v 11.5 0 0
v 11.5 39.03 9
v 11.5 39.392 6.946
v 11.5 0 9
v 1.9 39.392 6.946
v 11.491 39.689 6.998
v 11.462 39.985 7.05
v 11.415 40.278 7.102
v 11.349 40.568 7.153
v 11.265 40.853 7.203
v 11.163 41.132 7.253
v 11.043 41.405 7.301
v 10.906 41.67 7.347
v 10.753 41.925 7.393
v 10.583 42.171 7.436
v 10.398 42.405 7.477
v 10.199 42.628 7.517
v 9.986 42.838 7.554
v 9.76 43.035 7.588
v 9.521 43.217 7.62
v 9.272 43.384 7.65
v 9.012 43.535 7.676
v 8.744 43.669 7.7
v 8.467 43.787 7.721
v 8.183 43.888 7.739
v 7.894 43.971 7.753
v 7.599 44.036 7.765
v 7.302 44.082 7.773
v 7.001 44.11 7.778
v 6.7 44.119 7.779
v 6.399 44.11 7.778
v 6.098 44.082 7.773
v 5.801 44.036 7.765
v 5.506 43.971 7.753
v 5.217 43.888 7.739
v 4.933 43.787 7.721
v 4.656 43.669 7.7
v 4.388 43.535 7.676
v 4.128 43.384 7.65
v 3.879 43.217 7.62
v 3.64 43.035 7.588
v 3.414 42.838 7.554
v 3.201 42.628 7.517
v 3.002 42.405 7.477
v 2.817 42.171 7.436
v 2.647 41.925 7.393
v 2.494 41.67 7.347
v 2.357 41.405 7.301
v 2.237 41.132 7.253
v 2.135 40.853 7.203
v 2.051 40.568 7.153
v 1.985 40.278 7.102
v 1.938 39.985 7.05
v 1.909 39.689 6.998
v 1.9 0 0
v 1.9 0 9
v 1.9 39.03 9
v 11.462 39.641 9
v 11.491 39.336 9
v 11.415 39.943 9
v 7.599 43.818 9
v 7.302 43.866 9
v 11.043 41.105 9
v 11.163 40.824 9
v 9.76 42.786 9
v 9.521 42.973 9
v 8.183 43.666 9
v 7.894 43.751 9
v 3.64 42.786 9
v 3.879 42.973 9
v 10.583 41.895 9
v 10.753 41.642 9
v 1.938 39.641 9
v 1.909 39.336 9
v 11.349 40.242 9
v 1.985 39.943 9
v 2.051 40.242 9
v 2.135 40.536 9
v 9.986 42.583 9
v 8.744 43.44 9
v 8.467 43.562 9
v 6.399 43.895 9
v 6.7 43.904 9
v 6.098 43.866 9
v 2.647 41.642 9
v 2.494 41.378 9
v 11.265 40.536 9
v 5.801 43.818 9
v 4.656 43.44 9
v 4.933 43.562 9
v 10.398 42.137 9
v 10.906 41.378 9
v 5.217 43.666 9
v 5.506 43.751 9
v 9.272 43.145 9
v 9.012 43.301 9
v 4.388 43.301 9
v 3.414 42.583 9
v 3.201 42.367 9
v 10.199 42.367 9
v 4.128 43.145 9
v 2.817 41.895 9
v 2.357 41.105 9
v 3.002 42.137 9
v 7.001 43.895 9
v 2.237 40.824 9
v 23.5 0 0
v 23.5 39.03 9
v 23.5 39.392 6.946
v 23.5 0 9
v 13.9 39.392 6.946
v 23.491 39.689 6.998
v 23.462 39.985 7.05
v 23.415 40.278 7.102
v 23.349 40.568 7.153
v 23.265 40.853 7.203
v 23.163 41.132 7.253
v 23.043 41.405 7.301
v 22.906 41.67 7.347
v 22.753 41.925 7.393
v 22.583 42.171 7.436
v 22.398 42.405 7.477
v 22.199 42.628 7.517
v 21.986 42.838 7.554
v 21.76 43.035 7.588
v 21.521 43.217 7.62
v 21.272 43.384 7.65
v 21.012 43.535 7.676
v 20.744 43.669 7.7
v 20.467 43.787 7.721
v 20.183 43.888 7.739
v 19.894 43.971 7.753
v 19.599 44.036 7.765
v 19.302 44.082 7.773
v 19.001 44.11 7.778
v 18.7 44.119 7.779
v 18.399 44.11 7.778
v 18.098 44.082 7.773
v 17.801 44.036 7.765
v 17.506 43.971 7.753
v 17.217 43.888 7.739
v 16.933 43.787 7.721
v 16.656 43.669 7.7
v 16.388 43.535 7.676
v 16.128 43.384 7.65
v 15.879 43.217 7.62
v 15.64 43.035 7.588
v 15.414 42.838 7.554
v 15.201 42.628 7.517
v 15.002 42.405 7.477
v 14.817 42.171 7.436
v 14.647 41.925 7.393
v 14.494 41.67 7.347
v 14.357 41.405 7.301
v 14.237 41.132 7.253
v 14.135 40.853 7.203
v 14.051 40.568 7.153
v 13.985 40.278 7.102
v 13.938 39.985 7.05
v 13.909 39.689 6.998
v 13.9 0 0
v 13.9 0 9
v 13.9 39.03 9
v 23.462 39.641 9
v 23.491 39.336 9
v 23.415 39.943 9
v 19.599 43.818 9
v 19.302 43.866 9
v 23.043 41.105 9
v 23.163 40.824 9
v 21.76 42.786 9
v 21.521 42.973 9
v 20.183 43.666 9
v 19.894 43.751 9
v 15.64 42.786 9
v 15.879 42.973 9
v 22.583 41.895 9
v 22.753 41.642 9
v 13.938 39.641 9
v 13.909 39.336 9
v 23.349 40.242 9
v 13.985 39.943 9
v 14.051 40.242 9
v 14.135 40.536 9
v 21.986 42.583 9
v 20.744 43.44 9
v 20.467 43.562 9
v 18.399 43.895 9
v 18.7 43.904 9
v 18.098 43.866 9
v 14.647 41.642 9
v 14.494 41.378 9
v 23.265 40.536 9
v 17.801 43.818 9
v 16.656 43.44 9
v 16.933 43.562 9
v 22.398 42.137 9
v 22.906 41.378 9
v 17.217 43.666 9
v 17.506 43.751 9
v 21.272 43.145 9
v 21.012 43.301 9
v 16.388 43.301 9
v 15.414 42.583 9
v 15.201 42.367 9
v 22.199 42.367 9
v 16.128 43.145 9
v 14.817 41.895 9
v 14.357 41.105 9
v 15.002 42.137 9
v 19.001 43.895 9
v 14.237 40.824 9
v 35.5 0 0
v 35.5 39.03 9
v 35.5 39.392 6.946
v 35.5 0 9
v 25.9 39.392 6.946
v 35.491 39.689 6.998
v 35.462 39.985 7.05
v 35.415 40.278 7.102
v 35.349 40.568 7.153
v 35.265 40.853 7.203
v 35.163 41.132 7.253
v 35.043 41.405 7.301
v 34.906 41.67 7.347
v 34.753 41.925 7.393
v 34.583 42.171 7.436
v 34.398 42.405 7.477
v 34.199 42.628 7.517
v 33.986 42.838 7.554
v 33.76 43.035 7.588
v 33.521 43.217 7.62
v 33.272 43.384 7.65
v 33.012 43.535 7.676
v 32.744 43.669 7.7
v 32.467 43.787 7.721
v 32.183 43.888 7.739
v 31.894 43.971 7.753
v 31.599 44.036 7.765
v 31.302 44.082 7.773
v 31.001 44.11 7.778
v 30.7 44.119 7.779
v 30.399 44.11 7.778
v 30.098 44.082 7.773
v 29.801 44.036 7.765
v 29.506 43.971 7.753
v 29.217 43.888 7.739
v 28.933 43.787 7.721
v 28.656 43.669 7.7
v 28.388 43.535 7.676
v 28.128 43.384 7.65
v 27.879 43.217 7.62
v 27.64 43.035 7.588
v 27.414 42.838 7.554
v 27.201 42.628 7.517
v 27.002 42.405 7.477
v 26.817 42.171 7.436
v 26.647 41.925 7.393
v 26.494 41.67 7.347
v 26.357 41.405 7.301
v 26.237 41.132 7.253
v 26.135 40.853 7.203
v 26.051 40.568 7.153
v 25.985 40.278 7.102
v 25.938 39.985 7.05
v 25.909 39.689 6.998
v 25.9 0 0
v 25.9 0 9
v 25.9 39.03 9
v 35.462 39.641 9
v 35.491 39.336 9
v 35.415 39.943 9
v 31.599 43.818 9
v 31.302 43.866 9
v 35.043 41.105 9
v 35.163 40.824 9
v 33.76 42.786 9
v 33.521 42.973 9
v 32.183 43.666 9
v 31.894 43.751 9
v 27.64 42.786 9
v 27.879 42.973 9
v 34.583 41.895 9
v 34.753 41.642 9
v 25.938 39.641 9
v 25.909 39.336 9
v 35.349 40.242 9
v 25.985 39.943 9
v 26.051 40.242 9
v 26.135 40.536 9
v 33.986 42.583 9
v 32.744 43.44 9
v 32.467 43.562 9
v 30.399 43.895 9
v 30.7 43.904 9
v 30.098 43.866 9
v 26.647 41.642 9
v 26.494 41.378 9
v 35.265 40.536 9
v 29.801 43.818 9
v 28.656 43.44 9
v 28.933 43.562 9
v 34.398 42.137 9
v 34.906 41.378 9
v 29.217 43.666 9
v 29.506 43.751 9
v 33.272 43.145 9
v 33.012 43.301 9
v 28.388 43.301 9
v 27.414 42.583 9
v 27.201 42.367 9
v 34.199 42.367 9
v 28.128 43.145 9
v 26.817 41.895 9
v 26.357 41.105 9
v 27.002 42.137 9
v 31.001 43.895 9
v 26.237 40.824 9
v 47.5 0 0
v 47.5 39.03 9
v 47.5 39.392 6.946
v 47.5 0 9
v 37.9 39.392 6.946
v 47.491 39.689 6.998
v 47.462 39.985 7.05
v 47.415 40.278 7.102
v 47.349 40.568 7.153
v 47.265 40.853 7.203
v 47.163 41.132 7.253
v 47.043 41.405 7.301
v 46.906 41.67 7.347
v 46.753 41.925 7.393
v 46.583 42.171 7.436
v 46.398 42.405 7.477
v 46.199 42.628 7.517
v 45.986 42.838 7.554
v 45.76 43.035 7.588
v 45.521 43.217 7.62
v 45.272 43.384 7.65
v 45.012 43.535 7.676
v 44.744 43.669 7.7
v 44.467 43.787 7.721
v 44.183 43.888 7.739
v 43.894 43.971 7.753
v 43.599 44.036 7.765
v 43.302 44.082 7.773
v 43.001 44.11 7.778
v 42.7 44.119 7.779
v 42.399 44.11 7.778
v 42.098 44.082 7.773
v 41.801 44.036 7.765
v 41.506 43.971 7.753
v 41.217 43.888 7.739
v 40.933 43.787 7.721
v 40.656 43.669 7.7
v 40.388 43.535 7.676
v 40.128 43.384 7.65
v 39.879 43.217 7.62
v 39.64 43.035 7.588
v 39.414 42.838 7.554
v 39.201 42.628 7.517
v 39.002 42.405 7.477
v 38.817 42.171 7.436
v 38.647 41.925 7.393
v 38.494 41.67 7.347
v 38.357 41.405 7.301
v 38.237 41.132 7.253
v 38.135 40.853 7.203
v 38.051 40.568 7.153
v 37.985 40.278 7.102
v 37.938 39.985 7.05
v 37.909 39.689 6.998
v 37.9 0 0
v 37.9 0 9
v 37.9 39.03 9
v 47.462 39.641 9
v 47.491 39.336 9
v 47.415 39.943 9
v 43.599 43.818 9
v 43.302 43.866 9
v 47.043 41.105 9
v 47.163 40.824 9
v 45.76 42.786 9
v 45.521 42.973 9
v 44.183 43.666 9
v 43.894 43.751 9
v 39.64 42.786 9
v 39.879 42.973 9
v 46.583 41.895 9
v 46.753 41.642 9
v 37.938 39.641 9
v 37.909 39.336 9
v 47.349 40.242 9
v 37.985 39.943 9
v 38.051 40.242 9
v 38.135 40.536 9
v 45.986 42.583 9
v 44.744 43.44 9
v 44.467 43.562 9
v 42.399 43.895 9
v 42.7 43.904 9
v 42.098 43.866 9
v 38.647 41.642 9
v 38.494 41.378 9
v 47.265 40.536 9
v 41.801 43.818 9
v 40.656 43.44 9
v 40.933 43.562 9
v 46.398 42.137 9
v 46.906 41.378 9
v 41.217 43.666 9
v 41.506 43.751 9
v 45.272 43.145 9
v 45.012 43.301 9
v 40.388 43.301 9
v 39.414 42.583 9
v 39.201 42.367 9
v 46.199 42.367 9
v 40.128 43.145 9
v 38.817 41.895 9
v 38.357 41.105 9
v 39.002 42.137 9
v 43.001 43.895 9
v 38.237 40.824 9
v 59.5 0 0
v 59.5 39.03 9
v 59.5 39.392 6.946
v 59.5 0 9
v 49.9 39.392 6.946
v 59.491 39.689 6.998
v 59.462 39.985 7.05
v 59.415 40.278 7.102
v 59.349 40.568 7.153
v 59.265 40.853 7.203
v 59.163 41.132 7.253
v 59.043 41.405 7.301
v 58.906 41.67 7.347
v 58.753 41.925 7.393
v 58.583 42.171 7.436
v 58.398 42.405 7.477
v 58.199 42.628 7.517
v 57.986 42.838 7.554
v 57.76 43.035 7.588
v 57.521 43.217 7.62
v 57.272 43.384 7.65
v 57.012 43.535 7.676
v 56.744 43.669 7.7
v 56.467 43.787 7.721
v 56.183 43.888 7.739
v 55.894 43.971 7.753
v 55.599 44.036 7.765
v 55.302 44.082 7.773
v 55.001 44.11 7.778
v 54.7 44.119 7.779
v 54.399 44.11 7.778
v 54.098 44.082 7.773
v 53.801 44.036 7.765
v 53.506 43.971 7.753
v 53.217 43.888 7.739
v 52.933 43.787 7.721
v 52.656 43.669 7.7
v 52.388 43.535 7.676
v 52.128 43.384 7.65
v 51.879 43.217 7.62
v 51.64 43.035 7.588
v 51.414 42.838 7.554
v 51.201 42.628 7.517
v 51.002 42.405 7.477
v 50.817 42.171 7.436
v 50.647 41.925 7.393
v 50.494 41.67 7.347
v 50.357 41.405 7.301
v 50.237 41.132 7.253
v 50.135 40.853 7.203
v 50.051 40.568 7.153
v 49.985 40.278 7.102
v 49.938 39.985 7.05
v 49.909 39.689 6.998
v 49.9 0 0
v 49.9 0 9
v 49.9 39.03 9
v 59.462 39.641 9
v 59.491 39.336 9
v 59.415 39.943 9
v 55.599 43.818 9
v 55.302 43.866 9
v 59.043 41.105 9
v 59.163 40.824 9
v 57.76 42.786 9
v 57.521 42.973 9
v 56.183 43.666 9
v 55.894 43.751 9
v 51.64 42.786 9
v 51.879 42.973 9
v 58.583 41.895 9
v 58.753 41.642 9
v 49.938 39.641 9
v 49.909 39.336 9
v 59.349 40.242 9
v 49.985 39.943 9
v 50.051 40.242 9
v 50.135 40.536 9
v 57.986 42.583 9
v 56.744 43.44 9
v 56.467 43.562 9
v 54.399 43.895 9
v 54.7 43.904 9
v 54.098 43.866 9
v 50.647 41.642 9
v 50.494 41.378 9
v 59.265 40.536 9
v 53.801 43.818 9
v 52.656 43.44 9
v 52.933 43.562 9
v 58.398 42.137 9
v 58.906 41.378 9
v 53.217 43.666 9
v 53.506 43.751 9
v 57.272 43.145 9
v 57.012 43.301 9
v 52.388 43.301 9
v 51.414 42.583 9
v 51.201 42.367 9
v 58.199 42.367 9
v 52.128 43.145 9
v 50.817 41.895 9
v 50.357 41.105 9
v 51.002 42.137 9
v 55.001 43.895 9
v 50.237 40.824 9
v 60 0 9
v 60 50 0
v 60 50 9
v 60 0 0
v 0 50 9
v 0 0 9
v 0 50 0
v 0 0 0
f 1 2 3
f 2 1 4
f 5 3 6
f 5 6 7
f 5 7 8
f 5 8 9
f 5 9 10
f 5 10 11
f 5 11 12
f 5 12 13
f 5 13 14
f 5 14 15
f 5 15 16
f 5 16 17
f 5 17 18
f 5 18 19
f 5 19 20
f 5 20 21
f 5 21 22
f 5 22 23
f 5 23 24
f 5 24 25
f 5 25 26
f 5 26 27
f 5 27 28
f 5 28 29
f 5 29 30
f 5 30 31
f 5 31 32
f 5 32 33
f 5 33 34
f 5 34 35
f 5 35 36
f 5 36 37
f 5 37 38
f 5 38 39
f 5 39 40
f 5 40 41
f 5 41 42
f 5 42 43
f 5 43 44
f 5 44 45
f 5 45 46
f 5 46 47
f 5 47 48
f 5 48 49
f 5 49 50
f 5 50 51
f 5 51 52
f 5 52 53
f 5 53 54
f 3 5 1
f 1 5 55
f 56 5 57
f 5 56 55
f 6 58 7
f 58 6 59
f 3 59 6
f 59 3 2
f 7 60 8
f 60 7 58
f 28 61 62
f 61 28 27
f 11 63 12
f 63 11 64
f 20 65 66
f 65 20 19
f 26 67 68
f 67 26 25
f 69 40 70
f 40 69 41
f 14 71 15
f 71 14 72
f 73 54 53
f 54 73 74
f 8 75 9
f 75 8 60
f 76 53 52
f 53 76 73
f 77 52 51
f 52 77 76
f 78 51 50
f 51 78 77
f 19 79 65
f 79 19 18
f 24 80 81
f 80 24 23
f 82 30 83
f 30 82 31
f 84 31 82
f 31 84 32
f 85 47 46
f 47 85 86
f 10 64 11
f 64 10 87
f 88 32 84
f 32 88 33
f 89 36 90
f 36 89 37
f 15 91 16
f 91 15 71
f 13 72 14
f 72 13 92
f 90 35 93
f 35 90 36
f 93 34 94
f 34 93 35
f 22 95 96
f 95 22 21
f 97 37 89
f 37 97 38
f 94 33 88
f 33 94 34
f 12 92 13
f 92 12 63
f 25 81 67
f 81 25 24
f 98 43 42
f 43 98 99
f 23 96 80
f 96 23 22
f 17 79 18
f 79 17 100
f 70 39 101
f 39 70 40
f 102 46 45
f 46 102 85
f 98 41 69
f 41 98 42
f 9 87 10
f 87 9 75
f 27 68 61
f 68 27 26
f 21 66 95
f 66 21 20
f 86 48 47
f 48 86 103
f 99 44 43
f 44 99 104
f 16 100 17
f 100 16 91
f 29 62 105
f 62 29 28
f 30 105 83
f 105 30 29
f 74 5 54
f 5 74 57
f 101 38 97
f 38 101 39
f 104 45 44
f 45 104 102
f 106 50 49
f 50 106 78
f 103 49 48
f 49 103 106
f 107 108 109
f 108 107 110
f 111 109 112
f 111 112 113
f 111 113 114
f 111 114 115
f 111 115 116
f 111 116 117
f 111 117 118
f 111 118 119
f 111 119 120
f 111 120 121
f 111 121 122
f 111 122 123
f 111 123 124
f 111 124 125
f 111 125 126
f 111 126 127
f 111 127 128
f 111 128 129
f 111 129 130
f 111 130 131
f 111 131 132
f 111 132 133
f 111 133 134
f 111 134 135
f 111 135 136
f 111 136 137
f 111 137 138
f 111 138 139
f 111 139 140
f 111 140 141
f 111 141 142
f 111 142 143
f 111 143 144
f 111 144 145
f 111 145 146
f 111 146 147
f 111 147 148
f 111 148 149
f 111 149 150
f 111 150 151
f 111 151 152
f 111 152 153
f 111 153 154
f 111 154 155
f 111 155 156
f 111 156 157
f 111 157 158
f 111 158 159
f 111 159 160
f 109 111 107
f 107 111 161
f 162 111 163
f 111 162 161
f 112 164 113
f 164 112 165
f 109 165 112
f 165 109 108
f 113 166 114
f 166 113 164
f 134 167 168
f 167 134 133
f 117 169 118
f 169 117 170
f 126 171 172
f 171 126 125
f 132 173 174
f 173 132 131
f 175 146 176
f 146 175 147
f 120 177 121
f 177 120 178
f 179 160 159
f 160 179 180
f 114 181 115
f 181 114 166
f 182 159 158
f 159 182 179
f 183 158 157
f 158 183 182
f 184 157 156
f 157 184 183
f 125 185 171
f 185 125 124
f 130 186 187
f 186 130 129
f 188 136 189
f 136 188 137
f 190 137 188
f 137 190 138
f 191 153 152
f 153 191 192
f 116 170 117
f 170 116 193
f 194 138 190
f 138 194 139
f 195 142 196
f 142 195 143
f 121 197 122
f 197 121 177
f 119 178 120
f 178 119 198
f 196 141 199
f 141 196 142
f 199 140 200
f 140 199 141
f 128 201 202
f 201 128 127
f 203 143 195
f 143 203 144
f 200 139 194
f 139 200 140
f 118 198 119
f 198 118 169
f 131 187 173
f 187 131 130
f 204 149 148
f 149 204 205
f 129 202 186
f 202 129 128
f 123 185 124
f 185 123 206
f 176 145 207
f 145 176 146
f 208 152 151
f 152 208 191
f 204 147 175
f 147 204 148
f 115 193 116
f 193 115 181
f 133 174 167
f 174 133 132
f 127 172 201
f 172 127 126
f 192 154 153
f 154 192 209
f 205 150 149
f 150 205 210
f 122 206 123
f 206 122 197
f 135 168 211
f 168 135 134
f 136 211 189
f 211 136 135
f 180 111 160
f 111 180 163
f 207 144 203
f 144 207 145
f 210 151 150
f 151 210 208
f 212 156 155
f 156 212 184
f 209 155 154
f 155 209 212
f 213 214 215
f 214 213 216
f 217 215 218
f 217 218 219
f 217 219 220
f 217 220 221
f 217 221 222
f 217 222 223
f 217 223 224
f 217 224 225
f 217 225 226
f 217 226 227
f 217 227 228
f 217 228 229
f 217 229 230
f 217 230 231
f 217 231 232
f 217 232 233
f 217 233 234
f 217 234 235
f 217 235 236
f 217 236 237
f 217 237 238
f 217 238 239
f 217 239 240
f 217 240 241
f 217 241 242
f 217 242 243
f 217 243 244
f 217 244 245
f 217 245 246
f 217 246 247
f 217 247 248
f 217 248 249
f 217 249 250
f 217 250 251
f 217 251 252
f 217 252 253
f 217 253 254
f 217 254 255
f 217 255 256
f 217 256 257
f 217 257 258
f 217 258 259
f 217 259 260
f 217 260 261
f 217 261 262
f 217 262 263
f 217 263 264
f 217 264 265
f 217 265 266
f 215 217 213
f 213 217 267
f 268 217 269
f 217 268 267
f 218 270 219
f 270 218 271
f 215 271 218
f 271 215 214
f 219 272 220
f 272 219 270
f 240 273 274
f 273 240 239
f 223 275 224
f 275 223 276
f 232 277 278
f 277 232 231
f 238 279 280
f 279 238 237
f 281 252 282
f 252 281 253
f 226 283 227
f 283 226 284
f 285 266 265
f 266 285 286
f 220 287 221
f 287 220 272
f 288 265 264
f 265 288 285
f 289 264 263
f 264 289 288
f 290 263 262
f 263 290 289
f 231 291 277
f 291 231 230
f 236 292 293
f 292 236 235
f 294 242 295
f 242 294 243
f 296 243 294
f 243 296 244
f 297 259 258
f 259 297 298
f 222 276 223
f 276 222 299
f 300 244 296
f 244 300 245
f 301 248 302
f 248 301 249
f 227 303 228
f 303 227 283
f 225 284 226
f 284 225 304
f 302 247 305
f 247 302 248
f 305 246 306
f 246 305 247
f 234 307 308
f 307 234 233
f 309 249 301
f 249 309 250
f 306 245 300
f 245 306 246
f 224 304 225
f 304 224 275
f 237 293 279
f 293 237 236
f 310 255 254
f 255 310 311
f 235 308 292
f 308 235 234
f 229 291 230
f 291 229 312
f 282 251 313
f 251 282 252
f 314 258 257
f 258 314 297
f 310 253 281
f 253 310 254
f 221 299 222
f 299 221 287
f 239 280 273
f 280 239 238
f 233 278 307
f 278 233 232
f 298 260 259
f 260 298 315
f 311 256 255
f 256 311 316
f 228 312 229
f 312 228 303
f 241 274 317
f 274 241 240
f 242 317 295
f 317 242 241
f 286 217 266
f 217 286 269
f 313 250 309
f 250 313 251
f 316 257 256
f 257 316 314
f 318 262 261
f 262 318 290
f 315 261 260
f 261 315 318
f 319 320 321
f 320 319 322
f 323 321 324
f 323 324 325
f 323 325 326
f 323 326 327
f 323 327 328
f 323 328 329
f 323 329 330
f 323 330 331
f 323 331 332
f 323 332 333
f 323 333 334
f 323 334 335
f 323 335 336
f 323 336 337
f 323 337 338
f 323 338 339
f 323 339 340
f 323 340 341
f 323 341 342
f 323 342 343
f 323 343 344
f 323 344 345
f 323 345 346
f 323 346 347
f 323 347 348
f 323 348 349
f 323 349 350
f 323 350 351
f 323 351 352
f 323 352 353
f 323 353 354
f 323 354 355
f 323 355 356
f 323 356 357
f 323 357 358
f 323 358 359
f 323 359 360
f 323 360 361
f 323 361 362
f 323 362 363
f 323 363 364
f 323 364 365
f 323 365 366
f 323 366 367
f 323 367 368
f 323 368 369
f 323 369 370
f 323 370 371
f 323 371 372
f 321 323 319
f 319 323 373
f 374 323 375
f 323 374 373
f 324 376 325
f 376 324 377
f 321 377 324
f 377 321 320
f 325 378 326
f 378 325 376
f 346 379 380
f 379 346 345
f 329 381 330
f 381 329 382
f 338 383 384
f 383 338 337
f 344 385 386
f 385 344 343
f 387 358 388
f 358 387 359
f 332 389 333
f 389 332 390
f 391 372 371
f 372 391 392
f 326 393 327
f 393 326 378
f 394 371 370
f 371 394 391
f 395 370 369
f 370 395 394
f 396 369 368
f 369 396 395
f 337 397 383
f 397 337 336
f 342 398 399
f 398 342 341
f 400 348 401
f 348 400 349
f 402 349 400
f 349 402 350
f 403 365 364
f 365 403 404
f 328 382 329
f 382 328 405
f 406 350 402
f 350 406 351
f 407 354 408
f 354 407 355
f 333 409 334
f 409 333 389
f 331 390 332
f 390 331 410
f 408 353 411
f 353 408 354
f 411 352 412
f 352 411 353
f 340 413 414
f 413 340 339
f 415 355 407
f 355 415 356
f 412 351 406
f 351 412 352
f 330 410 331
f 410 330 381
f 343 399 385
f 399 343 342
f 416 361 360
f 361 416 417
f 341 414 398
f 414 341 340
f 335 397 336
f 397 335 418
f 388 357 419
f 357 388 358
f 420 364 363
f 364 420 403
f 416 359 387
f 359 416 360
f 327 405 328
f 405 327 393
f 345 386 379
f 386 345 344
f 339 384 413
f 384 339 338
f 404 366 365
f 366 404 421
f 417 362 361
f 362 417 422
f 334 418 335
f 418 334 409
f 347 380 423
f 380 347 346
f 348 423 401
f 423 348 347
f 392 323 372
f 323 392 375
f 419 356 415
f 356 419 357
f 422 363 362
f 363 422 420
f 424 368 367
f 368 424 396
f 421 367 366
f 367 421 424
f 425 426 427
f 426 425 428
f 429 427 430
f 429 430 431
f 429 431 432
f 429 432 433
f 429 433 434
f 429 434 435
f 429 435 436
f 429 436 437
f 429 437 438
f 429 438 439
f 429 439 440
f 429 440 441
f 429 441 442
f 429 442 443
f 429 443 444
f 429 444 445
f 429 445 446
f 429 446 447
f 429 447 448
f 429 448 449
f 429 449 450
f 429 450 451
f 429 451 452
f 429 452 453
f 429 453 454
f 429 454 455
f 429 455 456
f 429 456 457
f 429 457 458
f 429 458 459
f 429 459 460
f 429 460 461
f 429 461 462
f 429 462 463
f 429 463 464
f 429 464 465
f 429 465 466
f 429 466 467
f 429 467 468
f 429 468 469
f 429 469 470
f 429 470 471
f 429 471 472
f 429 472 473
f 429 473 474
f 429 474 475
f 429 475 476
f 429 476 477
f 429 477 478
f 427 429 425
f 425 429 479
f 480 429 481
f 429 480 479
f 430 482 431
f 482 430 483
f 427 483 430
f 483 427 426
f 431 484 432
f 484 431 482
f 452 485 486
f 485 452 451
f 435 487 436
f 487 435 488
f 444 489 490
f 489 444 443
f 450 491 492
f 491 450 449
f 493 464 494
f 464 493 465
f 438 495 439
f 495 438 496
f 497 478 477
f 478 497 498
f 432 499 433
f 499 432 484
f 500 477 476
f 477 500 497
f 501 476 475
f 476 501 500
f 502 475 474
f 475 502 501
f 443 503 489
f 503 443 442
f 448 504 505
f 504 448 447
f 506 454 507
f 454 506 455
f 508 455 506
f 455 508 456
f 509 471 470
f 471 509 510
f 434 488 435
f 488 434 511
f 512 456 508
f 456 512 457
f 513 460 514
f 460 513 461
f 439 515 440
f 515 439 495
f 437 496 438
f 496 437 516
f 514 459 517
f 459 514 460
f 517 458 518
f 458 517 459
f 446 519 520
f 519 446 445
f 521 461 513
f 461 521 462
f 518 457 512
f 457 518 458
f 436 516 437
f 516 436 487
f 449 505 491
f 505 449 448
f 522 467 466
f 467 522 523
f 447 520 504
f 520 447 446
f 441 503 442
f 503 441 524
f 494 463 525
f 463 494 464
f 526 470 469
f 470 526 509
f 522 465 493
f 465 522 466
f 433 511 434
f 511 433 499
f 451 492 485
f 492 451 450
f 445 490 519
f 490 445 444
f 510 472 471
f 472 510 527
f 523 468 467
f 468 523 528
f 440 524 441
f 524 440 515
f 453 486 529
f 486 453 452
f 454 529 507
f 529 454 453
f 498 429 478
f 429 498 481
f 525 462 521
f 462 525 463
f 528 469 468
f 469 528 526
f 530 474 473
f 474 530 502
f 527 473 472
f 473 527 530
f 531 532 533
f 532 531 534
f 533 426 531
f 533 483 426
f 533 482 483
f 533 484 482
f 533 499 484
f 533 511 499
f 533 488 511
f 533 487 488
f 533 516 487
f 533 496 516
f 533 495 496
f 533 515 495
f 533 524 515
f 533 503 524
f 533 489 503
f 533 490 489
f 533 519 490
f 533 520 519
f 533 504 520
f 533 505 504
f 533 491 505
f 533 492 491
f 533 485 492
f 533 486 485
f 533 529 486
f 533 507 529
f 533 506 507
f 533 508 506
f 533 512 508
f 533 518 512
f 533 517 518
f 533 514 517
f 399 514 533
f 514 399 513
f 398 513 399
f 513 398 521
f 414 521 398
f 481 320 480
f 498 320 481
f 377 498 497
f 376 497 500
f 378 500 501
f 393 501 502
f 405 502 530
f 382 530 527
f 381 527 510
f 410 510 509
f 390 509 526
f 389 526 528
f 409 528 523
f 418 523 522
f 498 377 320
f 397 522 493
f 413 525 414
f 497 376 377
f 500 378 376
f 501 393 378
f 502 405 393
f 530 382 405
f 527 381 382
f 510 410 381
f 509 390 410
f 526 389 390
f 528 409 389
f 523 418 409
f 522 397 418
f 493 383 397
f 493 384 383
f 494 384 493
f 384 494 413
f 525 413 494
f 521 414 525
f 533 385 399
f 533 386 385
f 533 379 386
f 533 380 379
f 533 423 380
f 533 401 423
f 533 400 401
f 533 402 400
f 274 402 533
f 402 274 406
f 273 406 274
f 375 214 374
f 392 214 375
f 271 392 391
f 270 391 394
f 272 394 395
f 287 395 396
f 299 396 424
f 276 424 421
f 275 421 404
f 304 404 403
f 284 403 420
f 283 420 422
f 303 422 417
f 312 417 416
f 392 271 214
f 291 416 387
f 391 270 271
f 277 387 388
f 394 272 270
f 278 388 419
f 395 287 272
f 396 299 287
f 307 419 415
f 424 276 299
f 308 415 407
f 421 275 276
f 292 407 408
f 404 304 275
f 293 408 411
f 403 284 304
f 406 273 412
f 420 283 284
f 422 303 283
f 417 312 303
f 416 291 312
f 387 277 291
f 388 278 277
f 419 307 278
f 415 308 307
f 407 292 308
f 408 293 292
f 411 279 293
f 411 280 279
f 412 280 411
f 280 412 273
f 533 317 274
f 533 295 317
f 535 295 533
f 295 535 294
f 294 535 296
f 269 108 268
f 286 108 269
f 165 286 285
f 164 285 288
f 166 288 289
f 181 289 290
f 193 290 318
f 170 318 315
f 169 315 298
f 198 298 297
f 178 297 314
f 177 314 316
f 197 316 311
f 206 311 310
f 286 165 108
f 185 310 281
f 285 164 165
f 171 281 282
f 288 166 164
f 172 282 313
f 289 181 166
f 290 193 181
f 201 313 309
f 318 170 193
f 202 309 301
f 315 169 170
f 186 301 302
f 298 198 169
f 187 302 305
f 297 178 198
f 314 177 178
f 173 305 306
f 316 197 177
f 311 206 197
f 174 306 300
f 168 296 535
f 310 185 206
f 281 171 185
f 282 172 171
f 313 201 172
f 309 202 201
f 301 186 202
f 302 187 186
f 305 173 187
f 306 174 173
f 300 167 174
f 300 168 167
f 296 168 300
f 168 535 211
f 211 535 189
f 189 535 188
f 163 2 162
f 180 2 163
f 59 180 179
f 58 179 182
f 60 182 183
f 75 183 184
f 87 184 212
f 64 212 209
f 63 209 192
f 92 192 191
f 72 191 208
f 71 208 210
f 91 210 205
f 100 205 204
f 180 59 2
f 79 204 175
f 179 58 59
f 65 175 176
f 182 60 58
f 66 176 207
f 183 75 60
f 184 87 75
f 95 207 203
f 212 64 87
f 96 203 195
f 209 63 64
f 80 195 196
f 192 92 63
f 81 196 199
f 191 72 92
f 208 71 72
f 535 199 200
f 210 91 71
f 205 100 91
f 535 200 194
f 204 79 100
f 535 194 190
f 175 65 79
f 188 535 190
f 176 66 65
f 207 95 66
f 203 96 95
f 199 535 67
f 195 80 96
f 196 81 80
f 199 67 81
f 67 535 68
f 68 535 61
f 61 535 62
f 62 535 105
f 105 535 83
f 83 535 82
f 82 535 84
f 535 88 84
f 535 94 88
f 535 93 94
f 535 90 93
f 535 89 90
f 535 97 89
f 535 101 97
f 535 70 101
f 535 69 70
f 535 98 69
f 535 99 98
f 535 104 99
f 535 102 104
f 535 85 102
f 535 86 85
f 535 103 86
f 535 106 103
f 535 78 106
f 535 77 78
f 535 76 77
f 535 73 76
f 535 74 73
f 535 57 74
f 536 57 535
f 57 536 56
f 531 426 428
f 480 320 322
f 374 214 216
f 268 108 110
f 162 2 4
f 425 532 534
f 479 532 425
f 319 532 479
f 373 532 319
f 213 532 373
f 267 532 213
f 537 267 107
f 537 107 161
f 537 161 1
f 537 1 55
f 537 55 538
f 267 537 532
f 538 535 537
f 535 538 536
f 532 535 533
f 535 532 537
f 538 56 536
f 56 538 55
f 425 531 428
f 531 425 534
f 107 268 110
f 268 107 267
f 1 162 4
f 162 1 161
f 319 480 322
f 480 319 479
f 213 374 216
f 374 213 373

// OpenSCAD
x_length=60;
y_length=50;
z_length=9;
rot=10; //angle of cuted segment
num=5; //number of cuted segment
perc=50;  //percent of cutted surface
oneCellXlength=x_length/num; //is computed


module cutfn(xl,yl,zl,rot){ //module cutter
perc=(10/perc);
translate([perc*(xl/num),0,0]){
yl=yl-0.2*yl;//math
xl=(xl/num)-perc*(xl/num);
rotate([rot,0,0]){
cube([xl,yl,zl]);
translate([xl/2,yl,0]) cylinder(h=z_length,r=xl/2, $fn=100);
}}}

module main_cube(){
cube([x_length,y_length,z_length]);
}

difference(){
main_cube();
for(i=[0:1:num]){
    xt=oneCellXlength*i-0.5; //-0.5obfuscated, do it better!
//echo (xt);
translate([xt,0,0]) cutfn(x_length,y_length,z_length,rot);
}
}
